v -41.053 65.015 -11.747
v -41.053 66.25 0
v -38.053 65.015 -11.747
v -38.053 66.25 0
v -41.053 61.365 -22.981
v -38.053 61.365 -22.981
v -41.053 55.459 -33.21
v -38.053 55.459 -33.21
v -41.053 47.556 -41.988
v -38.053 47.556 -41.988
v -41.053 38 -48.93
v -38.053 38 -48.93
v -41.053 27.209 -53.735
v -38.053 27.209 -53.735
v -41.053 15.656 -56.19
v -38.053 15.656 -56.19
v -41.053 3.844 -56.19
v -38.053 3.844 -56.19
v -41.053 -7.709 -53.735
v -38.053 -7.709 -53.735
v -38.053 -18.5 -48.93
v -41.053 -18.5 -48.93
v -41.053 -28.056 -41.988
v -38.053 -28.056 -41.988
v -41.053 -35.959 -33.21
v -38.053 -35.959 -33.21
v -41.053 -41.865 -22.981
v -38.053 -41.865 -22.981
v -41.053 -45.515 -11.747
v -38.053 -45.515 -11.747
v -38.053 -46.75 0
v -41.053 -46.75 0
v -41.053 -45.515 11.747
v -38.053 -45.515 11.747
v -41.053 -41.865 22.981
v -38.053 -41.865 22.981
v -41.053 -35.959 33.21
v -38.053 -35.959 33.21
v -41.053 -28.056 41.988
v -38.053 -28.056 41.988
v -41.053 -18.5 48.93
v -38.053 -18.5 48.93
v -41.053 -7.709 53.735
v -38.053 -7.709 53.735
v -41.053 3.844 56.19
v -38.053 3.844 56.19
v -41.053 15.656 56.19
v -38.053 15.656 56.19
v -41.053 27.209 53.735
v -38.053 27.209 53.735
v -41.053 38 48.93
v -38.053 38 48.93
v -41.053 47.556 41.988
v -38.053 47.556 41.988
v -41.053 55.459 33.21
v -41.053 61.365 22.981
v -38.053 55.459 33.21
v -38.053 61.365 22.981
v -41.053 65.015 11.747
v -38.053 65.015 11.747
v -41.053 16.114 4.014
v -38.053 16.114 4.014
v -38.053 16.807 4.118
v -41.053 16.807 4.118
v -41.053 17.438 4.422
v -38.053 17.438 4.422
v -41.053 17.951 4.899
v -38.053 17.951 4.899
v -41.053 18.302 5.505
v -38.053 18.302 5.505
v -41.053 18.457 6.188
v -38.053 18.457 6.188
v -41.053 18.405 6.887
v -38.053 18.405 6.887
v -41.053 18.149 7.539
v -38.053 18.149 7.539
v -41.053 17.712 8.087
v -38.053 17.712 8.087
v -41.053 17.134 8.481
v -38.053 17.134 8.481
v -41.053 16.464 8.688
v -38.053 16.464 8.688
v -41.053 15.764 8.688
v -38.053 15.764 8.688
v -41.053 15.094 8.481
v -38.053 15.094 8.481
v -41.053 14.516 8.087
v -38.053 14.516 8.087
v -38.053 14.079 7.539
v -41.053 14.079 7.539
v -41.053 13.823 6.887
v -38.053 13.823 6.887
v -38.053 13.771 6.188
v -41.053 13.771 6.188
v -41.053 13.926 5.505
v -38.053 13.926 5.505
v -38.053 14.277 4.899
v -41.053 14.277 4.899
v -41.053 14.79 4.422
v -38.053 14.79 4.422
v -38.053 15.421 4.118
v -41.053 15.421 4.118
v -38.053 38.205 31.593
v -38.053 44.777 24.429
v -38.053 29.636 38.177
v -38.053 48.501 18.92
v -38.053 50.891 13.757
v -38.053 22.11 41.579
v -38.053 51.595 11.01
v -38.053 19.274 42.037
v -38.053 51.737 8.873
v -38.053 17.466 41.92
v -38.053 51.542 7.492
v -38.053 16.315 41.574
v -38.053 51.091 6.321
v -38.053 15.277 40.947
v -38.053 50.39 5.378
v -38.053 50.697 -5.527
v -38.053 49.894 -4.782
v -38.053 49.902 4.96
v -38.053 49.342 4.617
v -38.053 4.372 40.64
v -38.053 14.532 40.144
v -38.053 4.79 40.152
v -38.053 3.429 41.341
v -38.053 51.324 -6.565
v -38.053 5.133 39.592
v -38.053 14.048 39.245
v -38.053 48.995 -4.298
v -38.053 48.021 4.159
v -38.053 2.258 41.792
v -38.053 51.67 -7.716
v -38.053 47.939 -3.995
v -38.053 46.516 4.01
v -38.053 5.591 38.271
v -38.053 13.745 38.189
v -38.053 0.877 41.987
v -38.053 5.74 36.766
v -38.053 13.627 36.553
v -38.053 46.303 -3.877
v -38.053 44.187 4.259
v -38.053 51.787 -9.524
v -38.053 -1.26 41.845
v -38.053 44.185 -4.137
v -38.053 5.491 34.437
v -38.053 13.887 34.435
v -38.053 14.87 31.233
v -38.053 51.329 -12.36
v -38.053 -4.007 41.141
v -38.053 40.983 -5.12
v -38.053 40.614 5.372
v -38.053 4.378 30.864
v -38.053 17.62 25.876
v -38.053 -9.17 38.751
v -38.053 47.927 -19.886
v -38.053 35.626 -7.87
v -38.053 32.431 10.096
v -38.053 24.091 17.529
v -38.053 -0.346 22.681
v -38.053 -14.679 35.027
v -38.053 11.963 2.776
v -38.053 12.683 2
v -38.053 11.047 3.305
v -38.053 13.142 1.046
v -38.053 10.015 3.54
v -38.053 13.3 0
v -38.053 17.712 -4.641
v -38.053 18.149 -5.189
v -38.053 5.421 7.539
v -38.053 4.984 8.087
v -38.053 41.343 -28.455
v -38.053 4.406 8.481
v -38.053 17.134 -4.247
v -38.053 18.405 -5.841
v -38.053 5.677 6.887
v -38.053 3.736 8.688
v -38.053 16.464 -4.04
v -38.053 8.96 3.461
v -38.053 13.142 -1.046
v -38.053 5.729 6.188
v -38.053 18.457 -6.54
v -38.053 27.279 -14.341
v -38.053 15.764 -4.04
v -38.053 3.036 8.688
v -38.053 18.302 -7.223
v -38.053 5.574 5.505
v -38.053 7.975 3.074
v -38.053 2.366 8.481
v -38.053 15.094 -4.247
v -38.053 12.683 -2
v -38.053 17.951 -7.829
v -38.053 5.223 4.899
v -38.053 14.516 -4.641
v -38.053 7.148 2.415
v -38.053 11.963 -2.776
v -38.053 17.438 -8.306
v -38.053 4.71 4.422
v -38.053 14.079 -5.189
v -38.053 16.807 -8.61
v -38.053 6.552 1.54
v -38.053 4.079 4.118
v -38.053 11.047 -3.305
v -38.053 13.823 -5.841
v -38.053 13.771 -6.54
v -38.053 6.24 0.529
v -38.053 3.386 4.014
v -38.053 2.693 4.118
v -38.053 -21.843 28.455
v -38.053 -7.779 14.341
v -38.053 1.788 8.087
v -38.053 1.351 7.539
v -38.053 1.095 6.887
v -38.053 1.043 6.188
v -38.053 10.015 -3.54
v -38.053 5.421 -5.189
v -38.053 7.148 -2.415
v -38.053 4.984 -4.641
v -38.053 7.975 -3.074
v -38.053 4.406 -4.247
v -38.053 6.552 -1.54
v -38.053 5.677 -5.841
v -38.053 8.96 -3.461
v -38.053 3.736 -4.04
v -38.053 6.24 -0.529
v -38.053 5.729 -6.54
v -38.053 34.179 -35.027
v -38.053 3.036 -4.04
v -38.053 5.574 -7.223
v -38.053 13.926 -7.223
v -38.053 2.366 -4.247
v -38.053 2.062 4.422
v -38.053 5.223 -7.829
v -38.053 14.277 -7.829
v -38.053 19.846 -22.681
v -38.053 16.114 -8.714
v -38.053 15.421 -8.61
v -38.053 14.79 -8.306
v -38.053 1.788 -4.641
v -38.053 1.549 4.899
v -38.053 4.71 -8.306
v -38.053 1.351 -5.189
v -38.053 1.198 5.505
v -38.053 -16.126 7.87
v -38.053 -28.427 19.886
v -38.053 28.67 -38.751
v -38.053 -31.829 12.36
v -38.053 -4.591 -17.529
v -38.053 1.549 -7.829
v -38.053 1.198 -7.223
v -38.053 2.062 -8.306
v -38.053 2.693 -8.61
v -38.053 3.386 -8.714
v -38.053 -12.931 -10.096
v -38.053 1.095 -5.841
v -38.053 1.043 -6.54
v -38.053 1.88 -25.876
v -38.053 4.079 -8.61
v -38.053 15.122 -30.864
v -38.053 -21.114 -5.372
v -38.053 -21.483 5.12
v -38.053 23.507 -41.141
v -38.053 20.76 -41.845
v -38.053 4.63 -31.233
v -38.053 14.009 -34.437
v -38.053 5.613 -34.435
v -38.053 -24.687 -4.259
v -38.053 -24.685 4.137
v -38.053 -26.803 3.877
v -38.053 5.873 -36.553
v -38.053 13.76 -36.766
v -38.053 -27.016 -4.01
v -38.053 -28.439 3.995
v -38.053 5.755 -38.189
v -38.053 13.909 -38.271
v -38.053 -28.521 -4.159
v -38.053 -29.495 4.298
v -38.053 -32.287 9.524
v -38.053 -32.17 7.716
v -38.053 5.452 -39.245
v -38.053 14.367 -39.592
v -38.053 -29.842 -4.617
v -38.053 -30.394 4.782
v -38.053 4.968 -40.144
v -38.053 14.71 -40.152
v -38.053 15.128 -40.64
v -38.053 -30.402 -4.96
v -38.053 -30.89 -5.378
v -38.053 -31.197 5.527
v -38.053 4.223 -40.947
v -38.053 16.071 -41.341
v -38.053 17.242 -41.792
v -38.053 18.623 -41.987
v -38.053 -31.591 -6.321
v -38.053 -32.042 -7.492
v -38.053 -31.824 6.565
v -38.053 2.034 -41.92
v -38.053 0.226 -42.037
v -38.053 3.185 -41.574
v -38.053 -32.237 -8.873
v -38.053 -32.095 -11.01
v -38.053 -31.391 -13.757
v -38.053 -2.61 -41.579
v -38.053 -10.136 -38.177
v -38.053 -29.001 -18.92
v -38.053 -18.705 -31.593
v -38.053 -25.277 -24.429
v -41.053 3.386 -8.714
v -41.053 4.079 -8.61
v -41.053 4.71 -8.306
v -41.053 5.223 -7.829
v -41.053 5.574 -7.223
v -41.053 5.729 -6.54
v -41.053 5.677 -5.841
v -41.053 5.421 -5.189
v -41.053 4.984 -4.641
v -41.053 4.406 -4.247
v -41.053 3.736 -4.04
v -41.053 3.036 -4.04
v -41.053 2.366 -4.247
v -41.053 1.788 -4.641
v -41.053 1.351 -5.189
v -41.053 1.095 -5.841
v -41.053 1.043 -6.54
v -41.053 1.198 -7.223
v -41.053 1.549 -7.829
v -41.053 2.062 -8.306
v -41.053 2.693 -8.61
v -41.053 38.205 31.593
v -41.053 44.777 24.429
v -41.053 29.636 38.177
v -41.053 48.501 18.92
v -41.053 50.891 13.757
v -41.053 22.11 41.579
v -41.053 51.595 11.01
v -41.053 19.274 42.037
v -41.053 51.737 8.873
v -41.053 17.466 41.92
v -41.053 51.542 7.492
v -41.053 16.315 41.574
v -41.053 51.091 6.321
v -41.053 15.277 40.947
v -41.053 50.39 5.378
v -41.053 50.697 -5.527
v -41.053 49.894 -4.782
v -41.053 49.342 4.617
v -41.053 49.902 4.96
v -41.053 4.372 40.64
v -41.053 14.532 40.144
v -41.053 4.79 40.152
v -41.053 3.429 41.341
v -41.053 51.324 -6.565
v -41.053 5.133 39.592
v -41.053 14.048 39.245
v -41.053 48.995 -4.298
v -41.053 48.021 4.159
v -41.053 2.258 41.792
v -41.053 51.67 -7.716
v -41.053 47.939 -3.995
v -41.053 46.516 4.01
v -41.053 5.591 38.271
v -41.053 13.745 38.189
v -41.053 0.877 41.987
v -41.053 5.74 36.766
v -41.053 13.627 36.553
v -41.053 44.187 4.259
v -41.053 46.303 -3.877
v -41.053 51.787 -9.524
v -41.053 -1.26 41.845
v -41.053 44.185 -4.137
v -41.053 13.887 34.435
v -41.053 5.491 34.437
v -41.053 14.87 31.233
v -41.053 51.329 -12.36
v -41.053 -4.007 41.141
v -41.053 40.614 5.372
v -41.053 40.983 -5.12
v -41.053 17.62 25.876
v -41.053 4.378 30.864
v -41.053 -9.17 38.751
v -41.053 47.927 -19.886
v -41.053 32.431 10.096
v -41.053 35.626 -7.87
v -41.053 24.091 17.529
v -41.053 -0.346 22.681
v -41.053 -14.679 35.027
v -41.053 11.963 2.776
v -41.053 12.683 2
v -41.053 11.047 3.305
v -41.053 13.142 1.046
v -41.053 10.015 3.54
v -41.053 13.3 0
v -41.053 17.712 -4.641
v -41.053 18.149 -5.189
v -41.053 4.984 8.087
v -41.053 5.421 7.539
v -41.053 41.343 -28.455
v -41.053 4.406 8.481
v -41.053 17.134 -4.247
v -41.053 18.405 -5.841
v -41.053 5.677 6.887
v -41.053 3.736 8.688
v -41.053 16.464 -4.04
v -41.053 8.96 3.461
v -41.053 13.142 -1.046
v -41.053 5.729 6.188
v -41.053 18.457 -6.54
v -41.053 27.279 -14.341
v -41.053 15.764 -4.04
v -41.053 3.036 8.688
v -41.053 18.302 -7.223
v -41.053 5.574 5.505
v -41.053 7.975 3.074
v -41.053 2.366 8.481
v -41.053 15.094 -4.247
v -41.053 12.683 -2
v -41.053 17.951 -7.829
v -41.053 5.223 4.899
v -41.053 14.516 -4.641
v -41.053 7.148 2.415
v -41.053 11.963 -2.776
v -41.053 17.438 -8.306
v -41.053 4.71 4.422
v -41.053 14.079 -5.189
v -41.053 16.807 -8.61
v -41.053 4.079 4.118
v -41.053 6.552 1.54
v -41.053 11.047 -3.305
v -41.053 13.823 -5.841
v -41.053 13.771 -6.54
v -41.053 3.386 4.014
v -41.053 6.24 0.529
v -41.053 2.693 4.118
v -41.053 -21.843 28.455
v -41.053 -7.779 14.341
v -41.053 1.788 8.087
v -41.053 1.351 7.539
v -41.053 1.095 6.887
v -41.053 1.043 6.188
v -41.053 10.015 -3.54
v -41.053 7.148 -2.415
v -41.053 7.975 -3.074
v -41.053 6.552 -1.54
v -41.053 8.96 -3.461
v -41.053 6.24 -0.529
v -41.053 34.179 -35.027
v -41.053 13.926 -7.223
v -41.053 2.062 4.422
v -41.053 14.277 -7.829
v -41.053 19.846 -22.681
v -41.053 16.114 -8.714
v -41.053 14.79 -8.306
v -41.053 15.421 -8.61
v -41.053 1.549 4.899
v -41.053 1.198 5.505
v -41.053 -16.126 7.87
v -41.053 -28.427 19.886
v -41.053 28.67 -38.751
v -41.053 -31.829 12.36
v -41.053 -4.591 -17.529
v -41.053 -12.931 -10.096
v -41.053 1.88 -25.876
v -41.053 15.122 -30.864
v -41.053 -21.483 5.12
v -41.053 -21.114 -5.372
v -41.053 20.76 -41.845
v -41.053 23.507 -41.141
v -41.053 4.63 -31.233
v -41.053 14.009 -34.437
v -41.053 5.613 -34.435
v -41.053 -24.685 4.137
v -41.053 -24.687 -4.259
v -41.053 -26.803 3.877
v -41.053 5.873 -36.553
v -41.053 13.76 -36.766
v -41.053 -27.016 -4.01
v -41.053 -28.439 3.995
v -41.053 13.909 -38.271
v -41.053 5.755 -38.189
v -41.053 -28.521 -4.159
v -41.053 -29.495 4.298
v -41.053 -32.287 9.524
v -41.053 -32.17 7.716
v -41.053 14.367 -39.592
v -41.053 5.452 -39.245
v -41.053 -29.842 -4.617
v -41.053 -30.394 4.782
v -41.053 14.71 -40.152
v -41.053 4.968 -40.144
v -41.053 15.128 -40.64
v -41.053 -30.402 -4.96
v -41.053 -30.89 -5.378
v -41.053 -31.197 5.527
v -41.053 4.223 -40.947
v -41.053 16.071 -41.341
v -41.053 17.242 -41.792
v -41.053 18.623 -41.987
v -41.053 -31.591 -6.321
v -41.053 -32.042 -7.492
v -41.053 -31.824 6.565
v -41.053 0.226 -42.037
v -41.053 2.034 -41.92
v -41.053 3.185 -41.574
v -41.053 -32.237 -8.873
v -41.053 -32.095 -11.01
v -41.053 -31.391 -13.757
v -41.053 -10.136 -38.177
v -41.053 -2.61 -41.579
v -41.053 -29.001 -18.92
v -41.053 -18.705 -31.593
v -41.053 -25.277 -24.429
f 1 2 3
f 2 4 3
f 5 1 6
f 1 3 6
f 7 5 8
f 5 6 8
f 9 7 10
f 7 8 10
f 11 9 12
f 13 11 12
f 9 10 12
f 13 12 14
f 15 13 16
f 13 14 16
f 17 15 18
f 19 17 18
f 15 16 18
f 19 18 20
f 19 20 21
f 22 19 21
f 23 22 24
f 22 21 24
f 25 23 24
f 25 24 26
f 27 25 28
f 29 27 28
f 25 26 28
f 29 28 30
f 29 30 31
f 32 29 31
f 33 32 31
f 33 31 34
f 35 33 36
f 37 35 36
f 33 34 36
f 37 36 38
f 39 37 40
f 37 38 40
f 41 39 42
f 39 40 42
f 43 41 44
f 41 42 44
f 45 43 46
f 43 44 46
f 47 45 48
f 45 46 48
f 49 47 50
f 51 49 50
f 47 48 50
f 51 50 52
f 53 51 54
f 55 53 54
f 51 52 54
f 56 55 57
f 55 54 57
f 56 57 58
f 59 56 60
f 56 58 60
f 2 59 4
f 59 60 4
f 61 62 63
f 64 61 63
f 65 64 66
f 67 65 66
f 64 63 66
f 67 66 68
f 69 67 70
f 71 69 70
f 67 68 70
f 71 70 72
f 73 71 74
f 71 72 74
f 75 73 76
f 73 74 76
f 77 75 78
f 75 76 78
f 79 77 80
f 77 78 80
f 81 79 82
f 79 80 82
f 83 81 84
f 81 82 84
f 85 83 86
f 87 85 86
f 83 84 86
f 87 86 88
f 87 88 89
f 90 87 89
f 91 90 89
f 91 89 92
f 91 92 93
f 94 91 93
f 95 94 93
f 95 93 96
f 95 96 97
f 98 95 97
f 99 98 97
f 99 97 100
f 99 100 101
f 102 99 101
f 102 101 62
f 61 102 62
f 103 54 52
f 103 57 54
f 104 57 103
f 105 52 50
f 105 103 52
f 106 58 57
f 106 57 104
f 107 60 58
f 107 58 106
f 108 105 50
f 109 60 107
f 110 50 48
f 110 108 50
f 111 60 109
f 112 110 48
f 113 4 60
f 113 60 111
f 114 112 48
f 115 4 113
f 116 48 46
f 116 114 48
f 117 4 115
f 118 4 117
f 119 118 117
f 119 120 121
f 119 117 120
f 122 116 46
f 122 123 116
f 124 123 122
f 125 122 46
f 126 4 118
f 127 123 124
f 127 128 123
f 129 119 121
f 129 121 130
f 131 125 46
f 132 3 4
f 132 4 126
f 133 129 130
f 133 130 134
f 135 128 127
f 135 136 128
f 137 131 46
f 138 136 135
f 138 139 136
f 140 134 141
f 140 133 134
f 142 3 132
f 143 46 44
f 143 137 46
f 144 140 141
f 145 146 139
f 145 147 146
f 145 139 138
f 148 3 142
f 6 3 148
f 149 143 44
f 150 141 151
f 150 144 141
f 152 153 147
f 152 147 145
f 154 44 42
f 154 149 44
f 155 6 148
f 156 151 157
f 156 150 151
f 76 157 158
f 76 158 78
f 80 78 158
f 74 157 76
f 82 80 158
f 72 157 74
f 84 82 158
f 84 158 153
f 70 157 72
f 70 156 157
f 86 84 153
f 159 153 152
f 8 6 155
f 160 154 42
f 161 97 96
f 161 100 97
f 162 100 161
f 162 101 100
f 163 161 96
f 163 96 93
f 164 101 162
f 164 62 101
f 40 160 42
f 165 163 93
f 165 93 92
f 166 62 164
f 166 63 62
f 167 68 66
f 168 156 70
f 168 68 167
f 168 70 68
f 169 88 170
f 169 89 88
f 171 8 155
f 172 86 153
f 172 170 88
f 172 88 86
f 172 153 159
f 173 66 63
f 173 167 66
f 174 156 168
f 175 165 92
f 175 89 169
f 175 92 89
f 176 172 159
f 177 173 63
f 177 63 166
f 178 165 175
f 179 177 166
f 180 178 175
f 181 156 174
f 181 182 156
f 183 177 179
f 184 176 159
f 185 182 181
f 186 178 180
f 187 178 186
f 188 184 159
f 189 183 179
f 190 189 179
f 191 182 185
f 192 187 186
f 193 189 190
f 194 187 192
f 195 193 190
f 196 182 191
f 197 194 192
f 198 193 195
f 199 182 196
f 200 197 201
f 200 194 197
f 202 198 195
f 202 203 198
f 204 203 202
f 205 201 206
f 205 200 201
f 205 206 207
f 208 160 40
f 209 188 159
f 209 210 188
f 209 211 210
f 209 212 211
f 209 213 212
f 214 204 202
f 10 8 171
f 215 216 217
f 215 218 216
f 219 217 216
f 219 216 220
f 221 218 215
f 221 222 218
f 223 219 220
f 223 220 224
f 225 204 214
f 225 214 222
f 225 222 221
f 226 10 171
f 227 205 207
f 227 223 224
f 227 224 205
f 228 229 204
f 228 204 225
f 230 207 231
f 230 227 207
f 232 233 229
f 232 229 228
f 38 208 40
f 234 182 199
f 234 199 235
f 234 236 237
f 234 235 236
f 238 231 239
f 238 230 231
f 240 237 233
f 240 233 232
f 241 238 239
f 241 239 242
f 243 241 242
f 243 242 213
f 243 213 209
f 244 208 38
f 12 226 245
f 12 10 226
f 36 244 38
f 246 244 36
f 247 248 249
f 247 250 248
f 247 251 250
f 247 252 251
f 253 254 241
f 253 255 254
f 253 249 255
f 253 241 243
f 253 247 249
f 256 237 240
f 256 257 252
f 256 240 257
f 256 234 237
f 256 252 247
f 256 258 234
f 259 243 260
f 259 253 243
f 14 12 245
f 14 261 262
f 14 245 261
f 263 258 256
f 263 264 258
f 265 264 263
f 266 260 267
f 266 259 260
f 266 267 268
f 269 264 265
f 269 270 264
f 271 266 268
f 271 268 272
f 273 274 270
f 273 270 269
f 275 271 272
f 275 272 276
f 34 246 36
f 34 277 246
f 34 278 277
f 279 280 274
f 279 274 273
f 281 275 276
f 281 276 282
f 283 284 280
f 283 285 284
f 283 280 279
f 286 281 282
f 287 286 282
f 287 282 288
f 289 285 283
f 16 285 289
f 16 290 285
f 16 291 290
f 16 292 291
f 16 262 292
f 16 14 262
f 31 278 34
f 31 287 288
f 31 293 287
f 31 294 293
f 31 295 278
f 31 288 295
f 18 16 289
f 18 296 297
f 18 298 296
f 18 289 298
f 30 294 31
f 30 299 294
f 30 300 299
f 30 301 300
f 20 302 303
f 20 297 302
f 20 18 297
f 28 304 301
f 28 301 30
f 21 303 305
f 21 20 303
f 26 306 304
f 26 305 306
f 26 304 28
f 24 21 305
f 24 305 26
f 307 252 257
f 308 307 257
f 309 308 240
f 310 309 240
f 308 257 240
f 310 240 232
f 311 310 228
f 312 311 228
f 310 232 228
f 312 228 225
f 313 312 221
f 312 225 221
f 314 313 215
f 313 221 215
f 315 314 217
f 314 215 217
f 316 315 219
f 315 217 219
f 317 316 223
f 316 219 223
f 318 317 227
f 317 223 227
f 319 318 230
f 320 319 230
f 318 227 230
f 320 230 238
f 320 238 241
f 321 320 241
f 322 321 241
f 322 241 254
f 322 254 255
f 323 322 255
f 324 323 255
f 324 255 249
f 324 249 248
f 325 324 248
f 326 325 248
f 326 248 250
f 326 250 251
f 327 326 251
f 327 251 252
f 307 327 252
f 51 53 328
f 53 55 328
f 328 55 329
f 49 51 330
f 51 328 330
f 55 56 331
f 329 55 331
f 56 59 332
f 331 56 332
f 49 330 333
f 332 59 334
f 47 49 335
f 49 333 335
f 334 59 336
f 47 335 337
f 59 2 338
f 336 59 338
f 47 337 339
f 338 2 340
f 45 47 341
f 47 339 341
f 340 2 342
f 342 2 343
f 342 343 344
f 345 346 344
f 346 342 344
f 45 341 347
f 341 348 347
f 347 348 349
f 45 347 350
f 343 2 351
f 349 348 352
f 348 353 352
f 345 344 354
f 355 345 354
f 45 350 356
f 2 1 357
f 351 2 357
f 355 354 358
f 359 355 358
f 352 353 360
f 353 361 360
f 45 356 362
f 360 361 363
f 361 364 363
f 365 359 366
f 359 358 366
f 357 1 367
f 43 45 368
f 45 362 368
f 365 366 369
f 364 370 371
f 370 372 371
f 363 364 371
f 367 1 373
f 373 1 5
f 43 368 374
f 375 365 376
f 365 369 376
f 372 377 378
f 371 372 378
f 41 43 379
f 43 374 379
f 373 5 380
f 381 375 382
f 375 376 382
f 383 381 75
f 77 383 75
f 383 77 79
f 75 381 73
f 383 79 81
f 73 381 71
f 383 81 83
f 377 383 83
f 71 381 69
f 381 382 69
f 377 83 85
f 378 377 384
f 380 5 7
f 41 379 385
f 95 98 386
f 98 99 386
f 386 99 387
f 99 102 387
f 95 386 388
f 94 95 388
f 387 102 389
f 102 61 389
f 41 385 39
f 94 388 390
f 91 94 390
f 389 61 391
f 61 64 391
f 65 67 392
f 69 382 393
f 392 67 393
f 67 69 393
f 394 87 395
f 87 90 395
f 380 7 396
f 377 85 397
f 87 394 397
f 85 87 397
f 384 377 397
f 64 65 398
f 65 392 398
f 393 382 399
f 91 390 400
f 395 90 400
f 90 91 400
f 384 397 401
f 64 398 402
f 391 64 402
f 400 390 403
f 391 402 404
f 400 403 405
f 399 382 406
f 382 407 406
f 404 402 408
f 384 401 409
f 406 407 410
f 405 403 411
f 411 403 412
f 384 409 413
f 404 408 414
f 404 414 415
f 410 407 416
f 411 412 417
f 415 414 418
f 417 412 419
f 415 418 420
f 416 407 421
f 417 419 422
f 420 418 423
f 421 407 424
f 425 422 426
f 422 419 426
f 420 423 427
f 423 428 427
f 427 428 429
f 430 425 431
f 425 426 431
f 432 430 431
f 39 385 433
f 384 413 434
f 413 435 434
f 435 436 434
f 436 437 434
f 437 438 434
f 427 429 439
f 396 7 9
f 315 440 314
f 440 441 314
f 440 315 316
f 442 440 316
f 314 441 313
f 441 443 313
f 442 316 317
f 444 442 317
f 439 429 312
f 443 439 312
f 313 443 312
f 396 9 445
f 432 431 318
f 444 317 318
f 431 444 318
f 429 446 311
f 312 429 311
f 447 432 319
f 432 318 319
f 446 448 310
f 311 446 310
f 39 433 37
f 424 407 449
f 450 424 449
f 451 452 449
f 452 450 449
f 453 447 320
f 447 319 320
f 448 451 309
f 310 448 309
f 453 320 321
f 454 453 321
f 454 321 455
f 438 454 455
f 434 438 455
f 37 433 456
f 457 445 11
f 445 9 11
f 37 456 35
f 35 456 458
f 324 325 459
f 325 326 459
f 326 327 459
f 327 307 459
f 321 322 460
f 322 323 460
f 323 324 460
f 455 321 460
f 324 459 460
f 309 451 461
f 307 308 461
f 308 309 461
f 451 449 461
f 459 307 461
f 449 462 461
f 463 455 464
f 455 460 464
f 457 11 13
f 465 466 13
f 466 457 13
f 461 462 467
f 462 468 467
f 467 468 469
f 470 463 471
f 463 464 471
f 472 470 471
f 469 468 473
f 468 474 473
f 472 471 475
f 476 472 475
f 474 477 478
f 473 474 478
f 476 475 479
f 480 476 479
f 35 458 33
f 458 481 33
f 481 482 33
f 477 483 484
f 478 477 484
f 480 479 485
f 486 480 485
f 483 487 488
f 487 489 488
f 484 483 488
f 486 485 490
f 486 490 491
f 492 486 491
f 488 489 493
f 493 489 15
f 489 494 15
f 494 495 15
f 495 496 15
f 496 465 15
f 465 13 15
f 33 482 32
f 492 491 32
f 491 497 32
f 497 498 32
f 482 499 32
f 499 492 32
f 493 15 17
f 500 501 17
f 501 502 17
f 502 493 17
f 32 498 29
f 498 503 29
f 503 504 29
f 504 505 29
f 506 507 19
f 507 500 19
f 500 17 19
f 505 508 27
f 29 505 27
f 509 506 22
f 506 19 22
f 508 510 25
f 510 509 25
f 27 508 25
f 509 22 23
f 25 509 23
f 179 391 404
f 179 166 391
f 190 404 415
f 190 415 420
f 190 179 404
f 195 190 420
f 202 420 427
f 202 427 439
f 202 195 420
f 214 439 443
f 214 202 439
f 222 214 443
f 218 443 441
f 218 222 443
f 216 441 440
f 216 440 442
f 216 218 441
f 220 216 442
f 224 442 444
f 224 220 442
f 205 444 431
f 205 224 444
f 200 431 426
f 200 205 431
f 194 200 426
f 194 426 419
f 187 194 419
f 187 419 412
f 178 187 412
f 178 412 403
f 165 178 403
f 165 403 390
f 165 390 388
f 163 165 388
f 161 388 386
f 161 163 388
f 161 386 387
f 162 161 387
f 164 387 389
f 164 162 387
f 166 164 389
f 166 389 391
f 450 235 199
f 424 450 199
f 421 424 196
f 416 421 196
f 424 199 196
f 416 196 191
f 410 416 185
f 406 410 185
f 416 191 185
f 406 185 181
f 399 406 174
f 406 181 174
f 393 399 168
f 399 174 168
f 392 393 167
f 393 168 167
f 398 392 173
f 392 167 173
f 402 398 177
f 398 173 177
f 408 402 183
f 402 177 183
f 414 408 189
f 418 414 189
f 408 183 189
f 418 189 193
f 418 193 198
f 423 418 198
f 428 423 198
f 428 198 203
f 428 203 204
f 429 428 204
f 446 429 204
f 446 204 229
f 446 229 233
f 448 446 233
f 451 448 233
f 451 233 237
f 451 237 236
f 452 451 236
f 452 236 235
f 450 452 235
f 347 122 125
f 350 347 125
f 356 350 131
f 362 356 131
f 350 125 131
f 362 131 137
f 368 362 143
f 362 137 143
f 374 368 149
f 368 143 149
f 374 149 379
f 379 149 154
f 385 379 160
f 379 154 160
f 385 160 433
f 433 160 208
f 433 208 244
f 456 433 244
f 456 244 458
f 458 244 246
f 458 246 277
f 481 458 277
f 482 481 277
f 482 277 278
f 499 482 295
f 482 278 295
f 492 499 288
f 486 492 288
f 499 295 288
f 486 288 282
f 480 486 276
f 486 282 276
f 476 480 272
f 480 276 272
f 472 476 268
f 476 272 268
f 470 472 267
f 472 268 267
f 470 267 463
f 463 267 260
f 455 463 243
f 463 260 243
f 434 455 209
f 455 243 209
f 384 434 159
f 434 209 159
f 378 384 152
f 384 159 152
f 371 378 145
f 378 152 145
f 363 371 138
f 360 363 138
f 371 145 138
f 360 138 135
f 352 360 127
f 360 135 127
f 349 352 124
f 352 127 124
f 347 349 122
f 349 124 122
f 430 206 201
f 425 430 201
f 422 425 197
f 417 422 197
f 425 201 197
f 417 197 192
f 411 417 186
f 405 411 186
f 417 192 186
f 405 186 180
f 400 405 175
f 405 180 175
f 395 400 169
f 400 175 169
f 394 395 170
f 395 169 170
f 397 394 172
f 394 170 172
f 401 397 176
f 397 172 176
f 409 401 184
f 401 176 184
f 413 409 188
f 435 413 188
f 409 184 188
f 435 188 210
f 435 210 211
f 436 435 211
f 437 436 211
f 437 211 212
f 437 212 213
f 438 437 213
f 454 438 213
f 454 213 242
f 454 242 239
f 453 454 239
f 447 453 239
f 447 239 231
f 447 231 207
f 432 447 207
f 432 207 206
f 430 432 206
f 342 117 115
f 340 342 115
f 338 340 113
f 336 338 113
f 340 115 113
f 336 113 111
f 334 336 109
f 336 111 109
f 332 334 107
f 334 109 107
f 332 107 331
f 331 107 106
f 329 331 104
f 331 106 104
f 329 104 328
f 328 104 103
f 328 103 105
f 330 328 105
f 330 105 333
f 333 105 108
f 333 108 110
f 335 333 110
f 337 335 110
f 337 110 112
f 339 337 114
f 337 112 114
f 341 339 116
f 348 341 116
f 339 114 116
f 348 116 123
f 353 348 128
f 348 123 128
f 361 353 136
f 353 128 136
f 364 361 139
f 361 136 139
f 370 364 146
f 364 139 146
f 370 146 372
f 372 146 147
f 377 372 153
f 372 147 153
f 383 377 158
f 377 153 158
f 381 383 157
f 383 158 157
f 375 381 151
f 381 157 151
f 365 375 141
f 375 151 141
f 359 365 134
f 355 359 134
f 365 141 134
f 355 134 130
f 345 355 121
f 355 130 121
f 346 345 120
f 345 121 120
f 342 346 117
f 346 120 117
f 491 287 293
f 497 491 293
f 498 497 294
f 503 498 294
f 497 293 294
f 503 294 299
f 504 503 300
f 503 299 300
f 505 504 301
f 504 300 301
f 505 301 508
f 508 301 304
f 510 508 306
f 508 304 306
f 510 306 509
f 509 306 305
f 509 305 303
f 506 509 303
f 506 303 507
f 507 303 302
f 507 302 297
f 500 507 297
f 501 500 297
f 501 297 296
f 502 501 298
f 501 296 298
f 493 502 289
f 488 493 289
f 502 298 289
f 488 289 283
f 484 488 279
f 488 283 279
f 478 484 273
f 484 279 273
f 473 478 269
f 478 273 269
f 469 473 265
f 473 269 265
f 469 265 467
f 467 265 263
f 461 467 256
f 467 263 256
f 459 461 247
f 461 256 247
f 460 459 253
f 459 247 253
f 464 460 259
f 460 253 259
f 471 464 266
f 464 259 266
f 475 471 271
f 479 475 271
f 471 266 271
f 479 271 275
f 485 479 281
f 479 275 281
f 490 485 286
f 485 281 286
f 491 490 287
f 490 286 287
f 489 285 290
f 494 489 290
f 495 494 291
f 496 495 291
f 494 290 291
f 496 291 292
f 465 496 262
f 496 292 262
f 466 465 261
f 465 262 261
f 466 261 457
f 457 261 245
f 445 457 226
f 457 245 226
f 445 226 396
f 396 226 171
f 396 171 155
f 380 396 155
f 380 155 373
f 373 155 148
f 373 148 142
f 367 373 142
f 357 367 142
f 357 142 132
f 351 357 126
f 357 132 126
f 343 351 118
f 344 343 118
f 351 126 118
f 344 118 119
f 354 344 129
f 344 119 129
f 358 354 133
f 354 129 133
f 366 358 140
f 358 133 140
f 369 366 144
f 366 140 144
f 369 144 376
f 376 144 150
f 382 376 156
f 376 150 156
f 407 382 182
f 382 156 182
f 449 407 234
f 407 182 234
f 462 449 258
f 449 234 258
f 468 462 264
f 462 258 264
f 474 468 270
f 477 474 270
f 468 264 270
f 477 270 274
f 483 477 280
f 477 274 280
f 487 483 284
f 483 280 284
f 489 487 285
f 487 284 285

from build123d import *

# Parameters (mm, degrees)
SKIZZE1_W                        = 3
SKIZZE1_H                        = 52.95
F_4_7_4_7_DURCHMESSER_BOHRUNG1_D = 4.7
SKIZZE5_RX                       = 25
SKIZZE5_RY                       = 10
SCHNITT_LINEAR_AUSTRAGEN1_DEPTH  = 3
KREISMUSTER1_COUNT               = 4


with BuildPart() as part:
    # Skizze1 → Rotation1 (revolve)
    with BuildSketch(Plane.XY):
        with Locations((-39.553372853, 39.775)):
            Rectangle(SKIZZE1_W, SKIZZE1_H)
    revolve(axis=Axis((-17.6629112, 9.75, 0), (-1, 0, 0)))

    # Ø4.7 (4.7) Durchmesser Bohrung1 (through all)
    with Locations(Plane(origin=(-41.053372853, 11.968723204, 19.868936148), x_dir=(0, 0, 1), z_dir=(-1, 0, 0))):
        with Locations((-13.504975118, -8.582684234), (-26.232897179, -8.582684234), (-26.232897179, 4.145237827), (-13.504975118, 4.145237827)):
            Hole(F_4_7_4_7_DURCHMESSER_BOHRUNG1_D / 2)

    # Skizze5 → Schnitt-Linear austragen1 (cut)
    with BuildSketch(Plane(origin=(-38.053372853, 0, 0), x_dir=(0, 0, -1), z_dir=(1, 0, 0))):
        with Locations(Location((-23.027329597, 32.684515508), (0, 0, 45.090609512))):
            Ellipse(SKIZZE5_RX, SKIZZE5_RY)
    schnitt_linear_austragen1 = extrude(amount=-SCHNITT_LINEAR_AUSTRAGEN1_DEPTH, mode=Mode.SUBTRACT)

    # Kreismuster1: Schnitt-Linear austragen1 ×4 about axis
    kreismuster1_axis = Axis((0, 9.75, 0), (-1, 0, 0))
    for i in range(1, KREISMUSTER1_COUNT):
        add(schnitt_linear_austragen1.rotate(kreismuster1_axis, i * 360 / KREISMUSTER1_COUNT), mode=Mode.SUBTRACT)


solid = part.part
